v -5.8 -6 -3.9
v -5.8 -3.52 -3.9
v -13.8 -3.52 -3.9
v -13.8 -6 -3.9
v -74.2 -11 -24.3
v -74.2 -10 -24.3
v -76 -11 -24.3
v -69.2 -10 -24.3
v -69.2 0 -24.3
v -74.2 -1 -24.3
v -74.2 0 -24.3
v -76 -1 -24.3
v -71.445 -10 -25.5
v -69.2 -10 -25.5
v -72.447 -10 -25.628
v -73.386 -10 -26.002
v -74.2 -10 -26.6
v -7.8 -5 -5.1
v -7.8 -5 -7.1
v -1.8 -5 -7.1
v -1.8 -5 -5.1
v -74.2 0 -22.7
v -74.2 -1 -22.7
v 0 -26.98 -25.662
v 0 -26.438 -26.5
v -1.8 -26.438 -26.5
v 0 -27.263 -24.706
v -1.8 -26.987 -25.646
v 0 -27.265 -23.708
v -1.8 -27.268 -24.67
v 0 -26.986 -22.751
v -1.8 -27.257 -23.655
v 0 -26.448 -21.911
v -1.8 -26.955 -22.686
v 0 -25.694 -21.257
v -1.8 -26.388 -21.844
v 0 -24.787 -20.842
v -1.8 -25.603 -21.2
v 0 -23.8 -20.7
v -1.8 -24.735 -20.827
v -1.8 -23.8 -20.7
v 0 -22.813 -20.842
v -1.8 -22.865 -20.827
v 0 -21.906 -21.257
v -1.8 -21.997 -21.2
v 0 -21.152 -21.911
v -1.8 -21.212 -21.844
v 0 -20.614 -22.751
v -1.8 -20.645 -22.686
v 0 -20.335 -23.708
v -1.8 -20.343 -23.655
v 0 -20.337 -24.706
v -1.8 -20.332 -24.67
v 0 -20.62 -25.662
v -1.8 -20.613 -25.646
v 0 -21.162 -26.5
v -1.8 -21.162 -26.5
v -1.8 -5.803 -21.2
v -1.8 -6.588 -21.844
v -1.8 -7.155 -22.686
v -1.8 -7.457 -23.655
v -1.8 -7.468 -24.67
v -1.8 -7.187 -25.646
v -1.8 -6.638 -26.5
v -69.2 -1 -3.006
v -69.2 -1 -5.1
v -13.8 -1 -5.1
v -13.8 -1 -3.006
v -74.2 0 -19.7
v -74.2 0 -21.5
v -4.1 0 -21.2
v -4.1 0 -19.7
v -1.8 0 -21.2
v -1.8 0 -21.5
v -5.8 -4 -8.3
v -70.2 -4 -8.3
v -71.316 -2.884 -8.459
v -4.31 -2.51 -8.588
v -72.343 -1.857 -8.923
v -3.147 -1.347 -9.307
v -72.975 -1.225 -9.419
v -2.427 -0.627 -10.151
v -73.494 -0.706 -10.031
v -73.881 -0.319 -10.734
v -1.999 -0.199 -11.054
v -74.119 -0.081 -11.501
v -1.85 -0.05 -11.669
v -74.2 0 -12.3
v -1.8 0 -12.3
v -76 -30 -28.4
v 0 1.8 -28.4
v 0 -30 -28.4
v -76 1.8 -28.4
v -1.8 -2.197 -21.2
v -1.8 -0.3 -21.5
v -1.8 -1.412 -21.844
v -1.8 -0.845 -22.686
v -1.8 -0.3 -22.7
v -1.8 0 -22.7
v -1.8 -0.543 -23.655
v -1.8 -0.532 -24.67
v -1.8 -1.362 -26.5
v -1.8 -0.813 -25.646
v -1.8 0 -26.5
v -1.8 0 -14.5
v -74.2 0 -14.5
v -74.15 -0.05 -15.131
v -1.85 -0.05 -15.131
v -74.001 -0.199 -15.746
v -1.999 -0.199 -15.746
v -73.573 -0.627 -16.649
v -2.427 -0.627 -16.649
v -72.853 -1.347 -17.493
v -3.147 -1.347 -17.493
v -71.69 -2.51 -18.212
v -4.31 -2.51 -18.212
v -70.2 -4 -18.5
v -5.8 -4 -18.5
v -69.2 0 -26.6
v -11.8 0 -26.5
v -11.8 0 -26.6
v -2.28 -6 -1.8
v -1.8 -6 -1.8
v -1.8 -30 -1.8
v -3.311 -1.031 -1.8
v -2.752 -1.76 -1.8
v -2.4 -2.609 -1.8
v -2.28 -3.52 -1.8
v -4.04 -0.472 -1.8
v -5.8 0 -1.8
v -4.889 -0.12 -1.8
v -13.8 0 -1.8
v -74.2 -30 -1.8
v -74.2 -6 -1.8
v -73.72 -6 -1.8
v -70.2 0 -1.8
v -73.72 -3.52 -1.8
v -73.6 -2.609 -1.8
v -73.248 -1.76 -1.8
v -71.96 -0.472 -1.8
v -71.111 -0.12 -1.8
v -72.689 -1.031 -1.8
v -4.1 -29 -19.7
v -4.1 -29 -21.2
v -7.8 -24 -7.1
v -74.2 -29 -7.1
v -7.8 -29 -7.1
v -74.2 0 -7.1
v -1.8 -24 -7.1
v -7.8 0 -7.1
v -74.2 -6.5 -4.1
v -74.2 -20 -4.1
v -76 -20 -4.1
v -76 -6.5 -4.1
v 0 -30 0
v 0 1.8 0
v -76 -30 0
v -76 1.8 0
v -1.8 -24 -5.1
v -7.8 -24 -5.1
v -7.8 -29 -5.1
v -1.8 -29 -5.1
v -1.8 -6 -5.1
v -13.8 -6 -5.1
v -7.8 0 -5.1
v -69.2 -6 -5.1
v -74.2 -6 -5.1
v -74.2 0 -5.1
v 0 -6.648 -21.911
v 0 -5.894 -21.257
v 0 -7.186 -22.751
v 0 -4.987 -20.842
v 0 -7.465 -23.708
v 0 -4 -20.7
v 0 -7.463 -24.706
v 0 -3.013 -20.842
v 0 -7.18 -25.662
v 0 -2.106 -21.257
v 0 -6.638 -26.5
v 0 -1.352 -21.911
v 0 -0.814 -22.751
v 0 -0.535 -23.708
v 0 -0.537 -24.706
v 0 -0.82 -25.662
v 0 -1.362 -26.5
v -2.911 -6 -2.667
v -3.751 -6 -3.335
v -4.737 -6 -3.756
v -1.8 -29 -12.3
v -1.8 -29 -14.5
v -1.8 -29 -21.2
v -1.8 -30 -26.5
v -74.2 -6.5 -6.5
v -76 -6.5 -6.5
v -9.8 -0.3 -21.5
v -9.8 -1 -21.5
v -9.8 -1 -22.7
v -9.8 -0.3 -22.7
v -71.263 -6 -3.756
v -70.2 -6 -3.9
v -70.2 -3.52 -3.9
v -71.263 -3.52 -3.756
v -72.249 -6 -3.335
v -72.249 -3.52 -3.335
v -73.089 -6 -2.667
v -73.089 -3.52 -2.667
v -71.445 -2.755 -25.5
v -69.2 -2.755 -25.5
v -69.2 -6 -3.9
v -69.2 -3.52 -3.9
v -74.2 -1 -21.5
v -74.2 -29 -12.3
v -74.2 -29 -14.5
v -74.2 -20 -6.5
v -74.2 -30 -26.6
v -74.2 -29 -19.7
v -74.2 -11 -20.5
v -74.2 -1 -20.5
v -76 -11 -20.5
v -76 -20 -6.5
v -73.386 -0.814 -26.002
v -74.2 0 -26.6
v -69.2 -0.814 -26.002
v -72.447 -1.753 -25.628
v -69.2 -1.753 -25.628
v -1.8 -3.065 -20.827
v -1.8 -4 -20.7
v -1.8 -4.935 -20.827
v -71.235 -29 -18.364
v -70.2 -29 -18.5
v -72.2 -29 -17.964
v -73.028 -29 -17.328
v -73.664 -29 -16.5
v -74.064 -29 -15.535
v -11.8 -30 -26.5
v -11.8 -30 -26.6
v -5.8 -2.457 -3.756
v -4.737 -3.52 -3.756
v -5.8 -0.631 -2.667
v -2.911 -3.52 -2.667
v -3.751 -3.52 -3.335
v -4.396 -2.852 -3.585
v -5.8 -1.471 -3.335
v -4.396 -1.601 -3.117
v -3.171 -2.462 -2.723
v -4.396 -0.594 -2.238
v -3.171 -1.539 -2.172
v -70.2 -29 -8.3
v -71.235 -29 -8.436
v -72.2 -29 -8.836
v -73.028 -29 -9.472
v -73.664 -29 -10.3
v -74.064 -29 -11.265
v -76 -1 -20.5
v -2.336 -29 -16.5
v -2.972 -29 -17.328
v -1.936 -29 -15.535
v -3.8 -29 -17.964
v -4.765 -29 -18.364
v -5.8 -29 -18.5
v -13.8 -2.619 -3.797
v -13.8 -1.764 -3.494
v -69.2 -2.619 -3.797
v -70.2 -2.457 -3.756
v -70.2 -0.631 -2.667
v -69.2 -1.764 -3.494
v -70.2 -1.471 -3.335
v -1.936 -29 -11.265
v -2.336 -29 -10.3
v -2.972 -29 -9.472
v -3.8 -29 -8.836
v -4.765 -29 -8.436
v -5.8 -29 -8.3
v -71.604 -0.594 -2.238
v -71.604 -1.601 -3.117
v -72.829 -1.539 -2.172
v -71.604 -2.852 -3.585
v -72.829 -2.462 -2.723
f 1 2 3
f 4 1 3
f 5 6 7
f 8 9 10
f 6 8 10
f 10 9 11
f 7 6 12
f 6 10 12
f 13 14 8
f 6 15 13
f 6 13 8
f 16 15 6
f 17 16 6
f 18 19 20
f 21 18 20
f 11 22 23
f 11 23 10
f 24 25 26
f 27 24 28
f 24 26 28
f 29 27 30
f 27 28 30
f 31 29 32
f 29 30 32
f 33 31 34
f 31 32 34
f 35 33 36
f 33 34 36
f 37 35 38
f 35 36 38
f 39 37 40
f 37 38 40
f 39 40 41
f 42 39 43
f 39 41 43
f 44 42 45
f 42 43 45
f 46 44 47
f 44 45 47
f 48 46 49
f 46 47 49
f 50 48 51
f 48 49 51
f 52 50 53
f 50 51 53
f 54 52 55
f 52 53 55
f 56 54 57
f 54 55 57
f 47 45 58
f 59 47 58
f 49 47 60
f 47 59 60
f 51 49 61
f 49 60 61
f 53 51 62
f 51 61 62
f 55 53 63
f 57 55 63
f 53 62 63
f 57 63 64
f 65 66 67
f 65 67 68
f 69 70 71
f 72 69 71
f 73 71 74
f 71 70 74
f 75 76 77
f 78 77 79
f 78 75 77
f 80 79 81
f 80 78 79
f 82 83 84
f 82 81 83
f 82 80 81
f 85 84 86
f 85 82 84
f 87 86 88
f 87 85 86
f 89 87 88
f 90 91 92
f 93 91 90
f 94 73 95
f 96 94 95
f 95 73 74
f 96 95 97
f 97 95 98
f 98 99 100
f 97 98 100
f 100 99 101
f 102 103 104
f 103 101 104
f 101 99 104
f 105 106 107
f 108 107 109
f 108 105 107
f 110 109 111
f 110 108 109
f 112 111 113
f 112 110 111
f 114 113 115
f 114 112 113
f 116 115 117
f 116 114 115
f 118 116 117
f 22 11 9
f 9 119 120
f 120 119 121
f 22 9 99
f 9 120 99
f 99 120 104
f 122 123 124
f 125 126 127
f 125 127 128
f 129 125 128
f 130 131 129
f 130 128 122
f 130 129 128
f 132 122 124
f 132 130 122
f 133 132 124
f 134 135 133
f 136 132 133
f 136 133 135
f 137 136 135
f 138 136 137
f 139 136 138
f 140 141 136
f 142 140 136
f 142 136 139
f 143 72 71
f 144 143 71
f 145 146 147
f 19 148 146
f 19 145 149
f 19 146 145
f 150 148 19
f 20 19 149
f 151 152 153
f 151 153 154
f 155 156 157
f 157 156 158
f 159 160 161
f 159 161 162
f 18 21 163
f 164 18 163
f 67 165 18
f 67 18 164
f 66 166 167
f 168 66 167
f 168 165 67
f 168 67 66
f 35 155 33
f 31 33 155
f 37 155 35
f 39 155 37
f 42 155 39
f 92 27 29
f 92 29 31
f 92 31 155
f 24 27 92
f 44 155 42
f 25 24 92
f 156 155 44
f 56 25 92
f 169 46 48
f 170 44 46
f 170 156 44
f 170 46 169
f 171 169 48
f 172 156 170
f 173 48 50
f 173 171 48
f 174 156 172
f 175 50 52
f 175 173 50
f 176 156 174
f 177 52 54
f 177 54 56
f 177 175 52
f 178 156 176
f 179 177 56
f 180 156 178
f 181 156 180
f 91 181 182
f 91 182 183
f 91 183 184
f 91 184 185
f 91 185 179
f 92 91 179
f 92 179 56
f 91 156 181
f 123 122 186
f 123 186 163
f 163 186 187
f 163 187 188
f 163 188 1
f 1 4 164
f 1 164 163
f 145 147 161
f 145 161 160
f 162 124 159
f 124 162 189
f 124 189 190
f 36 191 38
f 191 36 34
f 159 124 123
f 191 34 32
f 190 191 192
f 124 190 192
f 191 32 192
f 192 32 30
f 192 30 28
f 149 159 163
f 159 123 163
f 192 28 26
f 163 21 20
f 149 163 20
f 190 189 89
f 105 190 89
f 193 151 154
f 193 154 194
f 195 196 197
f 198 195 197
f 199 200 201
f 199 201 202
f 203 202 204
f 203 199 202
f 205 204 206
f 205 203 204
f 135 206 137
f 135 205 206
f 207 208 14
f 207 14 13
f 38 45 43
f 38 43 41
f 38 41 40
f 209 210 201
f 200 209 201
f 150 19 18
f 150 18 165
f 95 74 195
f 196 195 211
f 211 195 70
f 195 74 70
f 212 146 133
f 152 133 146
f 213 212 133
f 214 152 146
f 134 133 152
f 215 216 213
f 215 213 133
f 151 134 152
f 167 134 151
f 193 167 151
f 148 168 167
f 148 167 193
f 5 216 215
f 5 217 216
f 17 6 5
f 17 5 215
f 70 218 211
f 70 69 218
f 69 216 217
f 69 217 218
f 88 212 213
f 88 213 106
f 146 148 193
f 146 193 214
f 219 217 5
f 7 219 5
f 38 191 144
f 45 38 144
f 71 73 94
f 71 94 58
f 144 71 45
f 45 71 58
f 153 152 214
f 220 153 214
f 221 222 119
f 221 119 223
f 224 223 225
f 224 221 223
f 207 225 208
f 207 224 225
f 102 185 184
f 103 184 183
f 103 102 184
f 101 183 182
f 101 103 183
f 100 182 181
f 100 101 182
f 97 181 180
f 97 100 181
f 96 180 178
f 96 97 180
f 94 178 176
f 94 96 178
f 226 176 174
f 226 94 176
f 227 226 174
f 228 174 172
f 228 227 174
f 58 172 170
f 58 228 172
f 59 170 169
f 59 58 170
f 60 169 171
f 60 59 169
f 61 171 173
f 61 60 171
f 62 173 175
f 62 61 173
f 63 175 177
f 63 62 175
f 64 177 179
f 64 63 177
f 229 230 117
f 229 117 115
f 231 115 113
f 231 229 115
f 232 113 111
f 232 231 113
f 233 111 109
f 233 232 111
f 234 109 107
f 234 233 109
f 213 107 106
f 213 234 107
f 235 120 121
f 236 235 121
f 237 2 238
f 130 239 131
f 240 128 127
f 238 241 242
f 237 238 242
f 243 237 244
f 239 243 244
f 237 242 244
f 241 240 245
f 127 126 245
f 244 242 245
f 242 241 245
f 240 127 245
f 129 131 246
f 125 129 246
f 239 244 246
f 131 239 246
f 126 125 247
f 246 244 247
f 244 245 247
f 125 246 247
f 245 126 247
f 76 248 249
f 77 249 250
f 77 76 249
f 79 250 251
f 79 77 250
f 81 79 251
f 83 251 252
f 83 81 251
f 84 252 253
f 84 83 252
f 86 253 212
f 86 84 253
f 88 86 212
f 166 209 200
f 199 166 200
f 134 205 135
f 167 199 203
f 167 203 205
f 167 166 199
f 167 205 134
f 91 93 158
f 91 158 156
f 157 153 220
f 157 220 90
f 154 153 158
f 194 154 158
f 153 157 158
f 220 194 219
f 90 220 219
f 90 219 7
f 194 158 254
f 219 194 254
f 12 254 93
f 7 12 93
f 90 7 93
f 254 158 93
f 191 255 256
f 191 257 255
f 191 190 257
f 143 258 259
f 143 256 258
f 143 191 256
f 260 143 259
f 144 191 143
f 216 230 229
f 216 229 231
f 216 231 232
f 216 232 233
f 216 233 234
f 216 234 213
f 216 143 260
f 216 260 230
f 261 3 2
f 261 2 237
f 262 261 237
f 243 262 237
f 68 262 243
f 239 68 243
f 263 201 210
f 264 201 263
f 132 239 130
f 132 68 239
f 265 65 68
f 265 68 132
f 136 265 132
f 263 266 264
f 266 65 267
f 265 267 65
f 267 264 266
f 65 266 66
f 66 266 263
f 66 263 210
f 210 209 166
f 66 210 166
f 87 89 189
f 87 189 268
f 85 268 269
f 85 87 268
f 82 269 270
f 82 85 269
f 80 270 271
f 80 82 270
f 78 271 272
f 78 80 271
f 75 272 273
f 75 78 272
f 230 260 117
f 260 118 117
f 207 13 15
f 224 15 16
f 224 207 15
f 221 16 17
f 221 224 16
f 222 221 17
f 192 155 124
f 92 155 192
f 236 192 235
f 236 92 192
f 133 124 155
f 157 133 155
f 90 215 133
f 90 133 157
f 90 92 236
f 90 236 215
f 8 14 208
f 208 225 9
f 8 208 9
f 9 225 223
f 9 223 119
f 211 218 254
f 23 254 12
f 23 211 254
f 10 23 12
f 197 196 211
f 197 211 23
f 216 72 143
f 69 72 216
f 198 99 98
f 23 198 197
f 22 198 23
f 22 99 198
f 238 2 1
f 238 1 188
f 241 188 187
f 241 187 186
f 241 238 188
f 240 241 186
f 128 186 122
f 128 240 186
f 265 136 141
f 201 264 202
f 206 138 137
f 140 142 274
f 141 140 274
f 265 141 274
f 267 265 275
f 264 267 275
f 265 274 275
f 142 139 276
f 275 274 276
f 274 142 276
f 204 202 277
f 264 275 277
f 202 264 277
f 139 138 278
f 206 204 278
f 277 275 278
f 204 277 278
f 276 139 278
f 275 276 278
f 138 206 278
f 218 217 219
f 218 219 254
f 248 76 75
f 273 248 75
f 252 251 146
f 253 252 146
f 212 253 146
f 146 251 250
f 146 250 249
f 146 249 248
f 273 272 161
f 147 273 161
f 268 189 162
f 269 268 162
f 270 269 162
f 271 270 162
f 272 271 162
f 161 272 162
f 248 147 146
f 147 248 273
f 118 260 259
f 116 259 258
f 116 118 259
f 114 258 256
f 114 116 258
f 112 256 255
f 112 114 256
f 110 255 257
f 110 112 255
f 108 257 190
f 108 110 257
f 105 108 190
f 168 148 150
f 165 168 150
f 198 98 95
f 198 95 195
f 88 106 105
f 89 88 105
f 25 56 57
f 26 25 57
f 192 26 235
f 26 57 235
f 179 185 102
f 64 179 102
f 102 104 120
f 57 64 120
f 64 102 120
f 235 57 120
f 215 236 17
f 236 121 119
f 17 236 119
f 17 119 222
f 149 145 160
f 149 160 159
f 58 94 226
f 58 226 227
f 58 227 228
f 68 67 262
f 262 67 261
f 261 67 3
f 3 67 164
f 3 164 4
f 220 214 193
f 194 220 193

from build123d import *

# Parameters (mm, degrees)
SKETCH1_W            = 76
SKETCH1_H            = 28.4
BOSS_EXTRUDE1_DEPTH  = 1.8
SKETCH2_W            = 76
SKETCH2_H            = 1.8
BOSS_EXTRUDE2_DEPTH  = 30
SKETCH3_W            = 1.8
SKETCH3_H            = 26.6
BOSS_EXTRUDE3_DEPTH  = 30
SKETCH4_W            = 72.4
SKETCH4_H            = 1.2
BOSS_EXTRUDE4_DEPTH  = 1
SKETCH5_W            = 5
SKETCH5_H            = 1.2
BOSS_EXTRUDE5_DEPTH  = 28
SKETCH6_W            = 2.8
SKETCH6_H            = 10
CUT_EXTRUDE1_DEPTH   = 2
SKETCH7_W            = 5
SKETCH7_H            = 1.2
BOSS_EXTRUDE6_DEPTH  = 10
SKETCH8_W            = 8
SKETCH8_H            = 1.2
CUT_EXTRUDE2_DEPTH   = 0.7
SKETCH9_W            = 10
SKETCH9_H            = 0.1
BOSS_EXTRUDE7_DEPTH  = 30
CUT_EXTRUDE3_DEPTH   = 2
SKETCH11_W           = 62.4
SKETCH11_H           = 1.2
BOSS_EXTRUDE8_DEPTH  = 28
SKETCH12_W           = 72.4
SKETCH12_H           = 1.2
BOSS_EXTRUDE9_DEPTH  = 29
SKETCH13_W           = 72.4
SKETCH13_H           = 1.2
BOSS_EXTRUDE10_DEPTH = 1
SKETCH14_W           = 5
SKETCH14_H           = 1.2
SKETCH14_W_2         = 12
BOSS_EXTRUDE11_DEPTH = 5
SKETCH15_W           = 6
SKETCH15_H           = 5
BOSS_EXTRUDE12_DEPTH = 2
SKETCH16_W           = 2.4
SKETCH16_H           = 13.5
CUT_EXTRUDE4_DEPTH   = 2
SKETCH17_W           = 72.4
SKETCH17_H           = 1.8
BOSS_EXTRUDE13_DEPTH = 30
FILLET1_R            = 4
SKETCH19_W           = 2.3
SKETCH19_H           = 1.5
BOSS_EXTRUDE14_DEPTH = 29
FILLET2_R            = 4
FILLET3_R            = 4
FILLET4_R            = 4
SKETCH18_W           = 1
SKETCH18_H           = 10
CUT_EXTRUDE5_DEPTH   = 2


with BuildPart() as part:
    # Sketch1 → Boss-Extrude1 (new body)
    with BuildSketch(Plane(origin=(0, 0, 0), x_dir=(1, 0, 0), z_dir=(0, 1, 0))):
        with Locations((-38, 14.2)):
            Rectangle(SKETCH1_W, SKETCH1_H)
    extrude(amount=BOSS_EXTRUDE1_DEPTH)

    # Sketch2 → Boss-Extrude2 (add)
    with BuildSketch(Plane(origin=(0, 0, 0), x_dir=(-1, 0, 0), z_dir=(0, -1, 0))):
        with Locations((38, 27.5)):
            Rectangle(SKETCH2_W, SKETCH2_H)
    extrude(amount=BOSS_EXTRUDE2_DEPTH)

    # Sketch3 → Boss-Extrude3 (add)
    with BuildSketch(Plane(origin=(0, 0, 0), x_dir=(-1, 0, 0), z_dir=(0, -1, 0))):
        with Locations((75.1, 13.3)):
            Rectangle(SKETCH3_W, SKETCH3_H)
        with Locations((0.9, 13.3)):
            Rectangle(SKETCH3_W, SKETCH3_H)
    extrude(amount=BOSS_EXTRUDE3_DEPTH)

    # Sketch4 → Boss-Extrude4 (add)
    with BuildSketch(Plane(origin=(0, 0, 0), x_dir=(-1, 0, 0), z_dir=(0, -1, 0))):
        with Locations((38, 19.1)):
            Rectangle(SKETCH4_W, SKETCH4_H)
        with Locations((38, 22.1)):
            Rectangle(SKETCH4_W, SKETCH4_H)
    extrude(amount=BOSS_EXTRUDE4_DEPTH)

    # Sketch5 → Boss-Extrude5 (add)
    with BuildSketch(Plane(origin=(0, -1, 0), x_dir=(-1, 0, 0), z_dir=(0, -1, 0))):
        with Locations((4.3, 19.1)):
            Rectangle(SKETCH5_W, SKETCH5_H)
        with Locations((71.7, 19.1)):
            Rectangle(SKETCH5_W, SKETCH5_H)
    extrude(amount=BOSS_EXTRUDE5_DEPTH)

    # Sketch6 → Cut-Extrude1 (cut)
    with BuildSketch(Plane(origin=(-74.2, 0, 0), x_dir=(0, 0, -1), z_dir=(1, 0, 0))):
        with Locations((22.9, -6)):
            Rectangle(SKETCH6_W, SKETCH6_H)
    extrude(amount=-CUT_EXTRUDE1_DEPTH, mode=Mode.SUBTRACT)

    # Sketch7 → Boss-Extrude6 (add)
    with BuildSketch(Plane(origin=(0, 0, 0), x_dir=(-1, 0, 0), z_dir=(0, -1, 0))):
        with Locations((71.7, 24.9)):
            Rectangle(SKETCH7_W, SKETCH7_H)
    extrude(amount=BOSS_EXTRUDE6_DEPTH)

    # Sketch8 → Cut-Extrude2 (cut)
    with BuildSketch(Plane(origin=(0, -1, 0), x_dir=(-1, 0, 0), z_dir=(0, -1, 0))):
        with Locations((5.8, 22.1)):
            Rectangle(SKETCH8_W, SKETCH8_H)
    extrude(amount=-CUT_EXTRUDE2_DEPTH, mode=Mode.SUBTRACT)

    # Sketch9 → Boss-Extrude7 (add)
    with BuildSketch(Plane(origin=(0, 0, 0), x_dir=(-1, 0, 0), z_dir=(0, -1, 0))):
        with Locations((6.8, 26.55)):
            Rectangle(SKETCH9_W, SKETCH9_H)
    extrude(amount=BOSS_EXTRUDE7_DEPTH)

    # Sketch10 → Cut-Extrude3 (cut)
    with BuildSketch(Plane.ZY.offset(1.8)):
        with BuildLine():
            Line((-26.5, -6.638181192), (-26.5, -1.361818808))
            ThreePointArc((-26.5, -1.361818808), (-20.7, -4), (-26.5, -6.638181192))
        make_face()
        with BuildLine():
            Line((-26.5, -21.161818808), (-26.5, -26.438181192))
            ThreePointArc((-26.5, -26.438181192), (-20.7, -23.8), (-26.5, -21.161818808))
        make_face()
    extrude(amount=-CUT_EXTRUDE3_DEPTH, mode=Mode.SUBTRACT)

    # Sketch11 → Boss-Extrude8 (add)
    with BuildSketch(Plane(origin=(0, -1, 0), x_dir=(-1, 0, 0), z_dir=(0, -1, 0))):
        with Locations((38, 19.1)):
            Rectangle(SKETCH11_W, SKETCH11_H)
    extrude(amount=BOSS_EXTRUDE8_DEPTH)

    # Sketch12 → Boss-Extrude9 (add)
    with BuildSketch(Plane.XZ):
        with Locations((-38, -7.7)):
            Rectangle(SKETCH12_W, SKETCH12_H)
    extrude(amount=BOSS_EXTRUDE9_DEPTH)

    # Sketch13 → Boss-Extrude10 (add)
    with BuildSketch(Plane(origin=(0, 0, 0), x_dir=(-1, 0, 0), z_dir=(0, -1, 0))):
        with Locations((38, 4.5)):
            Rectangle(SKETCH13_W, SKETCH13_H)
    extrude(amount=BOSS_EXTRUDE10_DEPTH)

    # Sketch14 → Boss-Extrude11 (add)
    with BuildSketch(Plane(origin=(0, -1, 0), x_dir=(-1, 0, 0), z_dir=(0, -1, 0))):
        with Locations((71.7, 4.5)):
            Rectangle(SKETCH14_W, SKETCH14_H)
        with Locations((7.8, 4.5)):
            Rectangle(SKETCH14_W_2, SKETCH14_H)
    extrude(amount=BOSS_EXTRUDE11_DEPTH)

    # Sketch15 → Boss-Extrude12 (add)
    with BuildSketch(Plane.XY.offset(-7.1)):
        with Locations((-4.8, -26.5)):
            Rectangle(SKETCH15_W, SKETCH15_H)
        with Locations((-4.8, -2.5)):
            Rectangle(SKETCH15_W, SKETCH15_H)
    extrude(amount=BOSS_EXTRUDE12_DEPTH)

    # Sketch16 → Cut-Extrude4 (cut)
    with BuildSketch(Plane(origin=(-74.2, 0, 0), x_dir=(0, 0, -1), z_dir=(1, 0, 0))):
        with Locations((5.3, -13.25)):
            Rectangle(SKETCH16_W, SKETCH16_H)
    extrude(amount=-CUT_EXTRUDE4_DEPTH, mode=Mode.SUBTRACT)

    # Sketch17 → Boss-Extrude13 (add)
    with BuildSketch(Plane(origin=(0, 0, 0), x_dir=(-1, 0, 0), z_dir=(0, -1, 0))):
        with Locations((38, 0.9)):
            Rectangle(SKETCH17_W, SKETCH17_H)
    extrude(amount=BOSS_EXTRUDE13_DEPTH)

    # Fillet1
    # the kernel refuses this fillet: 4 mm, written as the material it adds along each edge
    with BuildSketch(Plane(origin=(-74.2, 0, -25.5), x_dir=(0, -1, 0), z_dir=(1, 0, 0))) as fillet1_piece_1:
        with BuildLine():
            CenterArc((2.754995463, 4), FILLET1_R, 226.468847833, 43.531152167)
            Line((0, 1.1), (-0.055099909, 1.042))
            ThreePointArc((-0.055099909, 1.042), (-0.08, 0.55), (-0.08, 0))
            Line((-0.08, 0), (0, -0.08))
            Line((0, -0.08), (2.754995463, -0.08))
            Line((2.754995463, -0.08), (2.754995463, 0))
        make_face()
    extrude(amount=5)
    with BuildSketch(Plane(origin=(-74.2, 0, -25.5), x_dir=(0, 0, -1), z_dir=(0, -1, 0))) as fillet1_piece_2:
        with BuildLine():
            CenterArc((4, 2.754995463), FILLET1_R, 180, 43.531152167)
            Line((0, 2.754995463), (-0.08, 2.754995463))
            Line((-0.08, 2.754995463), (-0.08, 0))
            Line((-0.08, 0), (0, -0.08))
            ThreePointArc((0, -0.08), (0.55, -0.08), (1.042, -0.055099909))
            Line((1.042, -0.055099909), (1.1, 0))
        make_face()
    extrude(amount=10)
    with BuildSketch(Plane(origin=(-1.8, 0, -8.3), x_dir=(0, 0, -1), z_dir=(0, -1, 0))) as fillet1_piece_3:
        with BuildLine():
            CenterArc((FILLET1_R, -FILLET1_R), FILLET1_R, 90, 90)
            Line((0, -FILLET1_R), (-FILLET1_R * 0.02, -FILLET1_R))
            Line((-FILLET1_R * 0.02, -FILLET1_R), (-FILLET1_R * 0.02, FILLET1_R * 0.02))
            Line((-FILLET1_R * 0.02, FILLET1_R * 0.02), (FILLET1_R, FILLET1_R * 0.02))
            Line((FILLET1_R, FILLET1_R * 0.02), (FILLET1_R, 0))
        make_face()
    extrude(amount=29)
    with BuildSketch(Plane(origin=(-1.8, 0, -8.3), x_dir=(0, 0, -1), z_dir=(-1, 0, 0)), Plane(origin=(-1.8, 0, -18.5), x_dir=(0, -1, 0), z_dir=(-1, 0, 0))) as fillet1_piece_4:
        with BuildLine():
            CenterArc((FILLET1_R, FILLET1_R), FILLET1_R, 180, 90)
            Line((0, FILLET1_R), (-FILLET1_R * 0.02, FILLET1_R))
            Line((-FILLET1_R * 0.02, FILLET1_R), (-FILLET1_R * 0.02, -FILLET1_R * 0.02))
            Line((-FILLET1_R * 0.02, -FILLET1_R * 0.02), (FILLET1_R, -FILLET1_R * 0.02))
            Line((FILLET1_R, -FILLET1_R * 0.02), (FILLET1_R, 0))
        make_face()
    extrude(amount=72.4)
    with BuildSketch(Plane(origin=(-74.2, 0, -8.3), x_dir=(0, 0, -1), z_dir=(0, -1, 0)), Plane(origin=(-1.8, 0, -18.5), x_dir=(0, 0, 1), z_dir=(0, -1, 0)), Plane(origin=(-74.2, -29, -18.5), x_dir=(0, 0, 1), z_dir=(0, 1, 0))) as fillet1_piece_5:
        with BuildLine():
            CenterArc((FILLET1_R, FILLET1_R), FILLET1_R, 180, 90)
            Line((0, FILLET1_R), (-FILLET1_R * 0.02, FILLET1_R))
            Line((-FILLET1_R * 0.02, FILLET1_R), (-FILLET1_R * 0.02, -FILLET1_R * 0.02))
            Line((-FILLET1_R * 0.02, -FILLET1_R * 0.02), (FILLET1_R, -FILLET1_R * 0.02))
            Line((FILLET1_R, -FILLET1_R * 0.02), (FILLET1_R, 0))
        make_face()
    extrude(amount=29)
    with BuildSketch(Plane(origin=(-74.2, 6.887488657, -25.5), x_dir=(0, 0, -1), z_dir=(0, -1, 0))) as fillet1_piece_6a_section:
        with BuildLine():
            CenterArc((4, 2.754995463), FILLET1_R, 180, 43.531152167)
            Line((0, 2.754995463), (-0.08, 2.754995463))
            Line((-0.08, 2.754995463), (-0.08, 0))
            Line((-0.08, 0), (0, -0.08))
            ThreePointArc((0, -0.08), (0.55, -0.08), (1.042, -0.055099909))
            Line((1.042, -0.055099909), (1.1, 0))
        make_face()
    fillet1_piece_6a = extrude(amount=16.887488657, mode=Mode.PRIVATE)
    fillet1_piece_6a = split(fillet1_piece_6a, bisect_by=Plane(origin=(-73.454361025, 0, -25.767986637), z_dir=(0, 1, 0)), keep=Keep.TOP, mode=Mode.PRIVATE)
    with BuildSketch(Plane(origin=(-81.087488657, 0, -25.5), x_dir=(0, -1, 0), z_dir=(1, 0, 0))) as fillet1_piece_6b_section:
        with BuildLine():
            CenterArc((2.754995463, 4), FILLET1_R, 226.468847833, 43.531152167)
            Line((0, 1.1), (-0.055099909, 1.042))
            ThreePointArc((-0.055099909, 1.042), (-0.08, 0.55), (-0.08, 0))
            Line((-0.08, 0), (0, -0.08))
            Line((0, -0.08), (2.754995463, -0.08))
            Line((2.754995463, -0.08), (2.754995463, 0))
        make_face()
    fillet1_piece_6b = extrude(amount=11.887488657, mode=Mode.PRIVATE)
    fillet1_piece_6b = split(fillet1_piece_6b, bisect_by=Plane(origin=(-74.2, -0.745638975, -25.767986637), z_dir=(-1, 0, 0)), keep=Keep.TOP, mode=Mode.PRIVATE)
    fillet1_piece_6 = fillet1_piece_6a & fillet1_piece_6b
    add(fillet1_piece_6)
    with BuildSketch(Plane(origin=(-1.8, 10, -8.3), x_dir=(0, 0, -1), z_dir=(0, -1, 0))) as fillet1_piece_7a_section:
        with BuildLine():
            CenterArc((FILLET1_R, -FILLET1_R), FILLET1_R, 90, 90)
            Line((0, -FILLET1_R), (-FILLET1_R * 0.02, -FILLET1_R))
            Line((-FILLET1_R * 0.02, -FILLET1_R), (-FILLET1_R * 0.02, FILLET1_R * 0.02))
            Line((-FILLET1_R * 0.02, FILLET1_R * 0.02), (FILLET1_R, FILLET1_R * 0.02))
            Line((FILLET1_R, FILLET1_R * 0.02), (FILLET1_R, 0))
        make_face()
    fillet1_piece_7a = extrude(amount=39, mode=Mode.PRIVATE)
    fillet1_piece_7a = split(fillet1_piece_7a, bisect_by=Plane(origin=(-2.705580457, 0, -9.205580457), z_dir=(0, 1, 0)), keep=Keep.TOP, mode=Mode.PRIVATE)
    with BuildSketch(Plane(origin=(8.2, 0, -8.3), x_dir=(0, 0, -1), z_dir=(-1, 0, 0))) as fillet1_piece_7b_section:
        with BuildLine():
            CenterArc((FILLET1_R, FILLET1_R), FILLET1_R, 180, 90)
            Line((0, FILLET1_R), (-FILLET1_R * 0.02, FILLET1_R))
            Line((-FILLET1_R * 0.02, FILLET1_R), (-FILLET1_R * 0.02, -FILLET1_R * 0.02))
            Line((-FILLET1_R * 0.02, -FILLET1_R * 0.02), (FILLET1_R, -FILLET1_R * 0.02))
            Line((FILLET1_R, -FILLET1_R * 0.02), (FILLET1_R, 0))
        make_face()
    fillet1_piece_7b = extrude(amount=82.4, mode=Mode.PRIVATE)
    fillet1_piece_7b = split(fillet1_piece_7b, bisect_by=Plane(origin=(-1.8, -0.905580457, -9.205580457), z_dir=(1, 0, 0)), keep=Keep.TOP, mode=Mode.PRIVATE)
    fillet1_piece_7 = fillet1_piece_7a & fillet1_piece_7b
    add(fillet1_piece_7)
    with BuildSketch(Plane(origin=(-74.2, 10, -8.3), x_dir=(0, 0, -1), z_dir=(0, -1, 0))) as fillet1_piece_8a_section:
        with BuildLine():
            CenterArc((FILLET1_R, FILLET1_R), FILLET1_R, 180, 90)
            Line((0, FILLET1_R), (-FILLET1_R * 0.02, FILLET1_R))
            Line((-FILLET1_R * 0.02, FILLET1_R), (-FILLET1_R * 0.02, -FILLET1_R * 0.02))
            Line((-FILLET1_R * 0.02, -FILLET1_R * 0.02), (FILLET1_R, -FILLET1_R * 0.02))
            Line((FILLET1_R, -FILLET1_R * 0.02), (FILLET1_R, 0))
        make_face()
    fillet1_piece_8a = extrude(amount=39, mode=Mode.PRIVATE)
    fillet1_piece_8a = split(fillet1_piece_8a, bisect_by=Plane(origin=(-73.294419543, 0, -9.205580457), z_dir=(0, 1, 0)), keep=Keep.TOP, mode=Mode.PRIVATE)
    with BuildSketch(Plane(origin=(-1.8, 0, -8.3), x_dir=(0, 0, -1), z_dir=(-1, 0, 0))) as fillet1_piece_8b_section:
        with BuildLine():
            CenterArc((FILLET1_R, FILLET1_R), FILLET1_R, 180, 90)
            Line((0, FILLET1_R), (-FILLET1_R * 0.02, FILLET1_R))
            Line((-FILLET1_R * 0.02, FILLET1_R), (-FILLET1_R * 0.02, -FILLET1_R * 0.02))
            Line((-FILLET1_R * 0.02, -FILLET1_R * 0.02), (FILLET1_R, -FILLET1_R * 0.02))
            Line((FILLET1_R, -FILLET1_R * 0.02), (FILLET1_R, 0))
        make_face()
    fillet1_piece_8b = extrude(amount=82.4, mode=Mode.PRIVATE)
    fillet1_piece_8b = split(fillet1_piece_8b, bisect_by=Plane(origin=(-74.2, -0.905580457, -9.205580457), z_dir=(-1, 0, 0)), keep=Keep.TOP, mode=Mode.PRIVATE)
    fillet1_piece_8 = fillet1_piece_8a & fillet1_piece_8b
    add(fillet1_piece_8)
    with BuildSketch(Plane(origin=(-1.8, 10, -18.5), x_dir=(0, 0, 1), z_dir=(0, -1, 0))) as fillet1_piece_9a_section:
        with BuildLine():
            CenterArc((FILLET1_R, FILLET1_R), FILLET1_R, 180, 90)
            Line((0, FILLET1_R), (-FILLET1_R * 0.02, FILLET1_R))
            Line((-FILLET1_R * 0.02, FILLET1_R), (-FILLET1_R * 0.02, -FILLET1_R * 0.02))
            Line((-FILLET1_R * 0.02, -FILLET1_R * 0.02), (FILLET1_R, -FILLET1_R * 0.02))
            Line((FILLET1_R, -FILLET1_R * 0.02), (FILLET1_R, 0))
        make_face()
    fillet1_piece_9a = extrude(amount=39, mode=Mode.PRIVATE)
    fillet1_piece_9a = split(fillet1_piece_9a, bisect_by=Plane(origin=(-2.705580457, 0, -17.594419543), z_dir=(0, 1, 0)), keep=Keep.TOP, mode=Mode.PRIVATE)
    with BuildSketch(Plane(origin=(8.2, 0, -18.5), x_dir=(0, -1, 0), z_dir=(-1, 0, 0))) as fillet1_piece_9b_section:
        with BuildLine():
            CenterArc((FILLET1_R, FILLET1_R), FILLET1_R, 180, 90)
            Line((0, FILLET1_R), (-FILLET1_R * 0.02, FILLET1_R))
            Line((-FILLET1_R * 0.02, FILLET1_R), (-FILLET1_R * 0.02, -FILLET1_R * 0.02))
            Line((-FILLET1_R * 0.02, -FILLET1_R * 0.02), (FILLET1_R, -FILLET1_R * 0.02))
            Line((FILLET1_R, -FILLET1_R * 0.02), (FILLET1_R, 0))
        make_face()
    fillet1_piece_9b = extrude(amount=82.4, mode=Mode.PRIVATE)
    fillet1_piece_9b = split(fillet1_piece_9b, bisect_by=Plane(origin=(-1.8, -0.905580457, -17.594419543), z_dir=(1, 0, 0)), keep=Keep.TOP, mode=Mode.PRIVATE)
    fillet1_piece_9 = fillet1_piece_9a & fillet1_piece_9b
    add(fillet1_piece_9)
    with BuildSketch(Plane(origin=(-74.2, -29, -18.5), x_dir=(0, 0, 1), z_dir=(0, 1, 0))) as fillet1_piece_10a_section:
        with BuildLine():
            CenterArc((FILLET1_R, FILLET1_R), FILLET1_R, 180, 90)
            Line((0, FILLET1_R), (-FILLET1_R * 0.02, FILLET1_R))
            Line((-FILLET1_R * 0.02, FILLET1_R), (-FILLET1_R * 0.02, -FILLET1_R * 0.02))
            Line((-FILLET1_R * 0.02, -FILLET1_R * 0.02), (FILLET1_R, -FILLET1_R * 0.02))
            Line((FILLET1_R, -FILLET1_R * 0.02), (FILLET1_R, 0))
        make_face()
    fillet1_piece_10a = extrude(amount=39, mode=Mode.PRIVATE)
    fillet1_piece_10a = split(fillet1_piece_10a, bisect_by=Plane(origin=(-73.294419543, 0, -17.594419543), z_dir=(0, 1, 0)), keep=Keep.TOP, mode=Mode.PRIVATE)
    with BuildSketch(Plane(origin=(-1.8, 0, -18.5), x_dir=(0, -1, 0), z_dir=(-1, 0, 0))) as fillet1_piece_10b_section:
        with BuildLine():
            CenterArc((FILLET1_R, FILLET1_R), FILLET1_R, 180, 90)
            Line((0, FILLET1_R), (-FILLET1_R * 0.02, FILLET1_R))
            Line((-FILLET1_R * 0.02, FILLET1_R), (-FILLET1_R * 0.02, -FILLET1_R * 0.02))
            Line((-FILLET1_R * 0.02, -FILLET1_R * 0.02), (FILLET1_R, -FILLET1_R * 0.02))
            Line((FILLET1_R, -FILLET1_R * 0.02), (FILLET1_R, 0))
        make_face()
    fillet1_piece_10b = extrude(amount=82.4, mode=Mode.PRIVATE)
    fillet1_piece_10b = split(fillet1_piece_10b, bisect_by=Plane(origin=(-74.2, -0.905580457, -17.594419543), z_dir=(-1, 0, 0)), keep=Keep.TOP, mode=Mode.PRIVATE)
    fillet1_piece_10 = fillet1_piece_10a & fillet1_piece_10b
    add(fillet1_piece_10)

    # Sketch19 → Boss-Extrude14 (add)
    with BuildSketch(Plane(origin=(0, 0, 0), x_dir=(-1, 0, 0), z_dir=(0, -1, 0))):
        with Locations((2.95, 20.45)):
            Rectangle(SKETCH19_W, SKETCH19_H)
    extrude(amount=BOSS_EXTRUDE14_DEPTH)

    # Fillet2
    # the kernel refuses this fillet: 4 mm, written as the material it adds along each edge
    with BuildSketch(Plane(origin=(-74.2, 0, -3.9), x_dir=(0, 0, 1), z_dir=(1, 0, 0))) as fillet2_piece_1_section:
        with BuildLine():
            CenterArc((4, 3.519943181), FILLET2_R, 180, 61.640649972)
            Line((0, 3.519943181), (-0.08, 3.519943181))
            Line((-0.08, 3.519943181), (-0.08, 0))
            Line((-0.08, 0), (0, -0.08))
            ThreePointArc((0, -0.08), (1.05, -0.08), (2.062, -0.070398864))
            Line((2.062, -0.070398864), (2.1, 0))
        make_face()
    fillet2_piece_1 = extrude(amount=72.4, mode=Mode.PRIVATE)
    fillet2_piece_1 = split(fillet2_piece_1, bisect_by=Plane(origin=(-69.2, -0.386743346, -3.163583033), z_dir=(-1, 0, 0)), keep=Keep.TOP, mode=Mode.PRIVATE)
    fillet2_piece_1 = split(fillet2_piece_1, bisect_by=Plane(origin=(-71.7, -1, -3.163583033), z_dir=(0, 1, 0)), keep=Keep.TOP, mode=Mode.PRIVATE)
    add(fillet2_piece_1)
    with BuildSketch(Plane(origin=(-74.2, 0, -3.9), x_dir=(0, 0, 1), z_dir=(1, 0, 0))) as fillet2_piece_2_section:
        with BuildLine():
            CenterArc((4, 3.519943181), FILLET2_R, 180, 61.640649972)
            Line((0, 3.519943181), (-0.08, 3.519943181))
            Line((-0.08, 3.519943181), (-0.08, 0))
            Line((-0.08, 0), (0, -0.08))
            ThreePointArc((0, -0.08), (1.05, -0.08), (2.062, -0.070398864))
            Line((2.062, -0.070398864), (2.1, 0))
        make_face()
    fillet2_piece_2 = extrude(amount=72.4, mode=Mode.PRIVATE)
    fillet2_piece_2 = split(fillet2_piece_2, bisect_by=Plane(origin=(-69.2, -1.757123938, -3.704514418), z_dir=(-1, 0, 0)), keep=Keep.TOP, mode=Mode.PRIVATE)
    fillet2_piece_2 = split(fillet2_piece_2, bisect_by=Plane(origin=(-71.7, -1, -3.704514418), z_dir=(0, -1, 0)), keep=Keep.TOP, mode=Mode.PRIVATE)
    add(fillet2_piece_2)
    with BuildSketch(Plane(origin=(-74.2, 0, -3.9), x_dir=(0, 0, 1), z_dir=(1, 0, 0))) as fillet2_piece_3_section:
        with BuildLine():
            CenterArc((4, 3.519943181), FILLET2_R, 180, 61.640649972)
            Line((0, 3.519943181), (-0.08, 3.519943181))
            Line((-0.08, 3.519943181), (-0.08, 0))
            Line((-0.08, 0), (0, -0.08))
            ThreePointArc((0, -0.08), (1.05, -0.08), (2.062, -0.070398864))
            Line((2.062, -0.070398864), (2.1, 0))
        make_face()
    fillet2_piece_3 = extrude(amount=72.4, mode=Mode.PRIVATE)
    fillet2_piece_3 = split(fillet2_piece_3, bisect_by=Plane(origin=(-69.2, -0.386743346, -3.163583033), z_dir=(1, 0, 0)), keep=Keep.TOP, mode=Mode.PRIVATE)
    fillet2_piece_3 = split(fillet2_piece_3, bisect_by=Plane(origin=(-41.5, -1, -3.163583033), z_dir=(0, 1, 0)), keep=Keep.TOP, mode=Mode.PRIVATE)
    fillet2_piece_3 = split(fillet2_piece_3, bisect_by=Plane(origin=(-13.8, -0.386743346, -3.163583033), z_dir=(-1, 0, 0)), keep=Keep.TOP, mode=Mode.PRIVATE)
    add(fillet2_piece_3)
    with BuildSketch(Plane(origin=(-74.2, 0, -3.9), x_dir=(0, 0, 1), z_dir=(1, 0, 0))) as fillet2_piece_4_section:
        with BuildLine():
            CenterArc((4, 3.519943181), FILLET2_R, 180, 61.640649972)
            Line((0, 3.519943181), (-0.08, 3.519943181))
            Line((-0.08, 3.519943181), (-0.08, 0))
            Line((-0.08, 0), (0, -0.08))
            ThreePointArc((0, -0.08), (1.05, -0.08), (2.062, -0.070398864))
            Line((2.062, -0.070398864), (2.1, 0))
        make_face()
    fillet2_piece_4 = extrude(amount=72.4, mode=Mode.PRIVATE)
    fillet2_piece_4 = split(fillet2_piece_4, bisect_by=Plane(origin=(-7.8, -1, -3.163583033), z_dir=(0, 1, 0)), keep=Keep.TOP, mode=Mode.PRIVATE)
    fillet2_piece_4 = split(fillet2_piece_4, bisect_by=Plane(origin=(-13.8, -0.386743346, -3.163583033), z_dir=(1, 0, 0)), keep=Keep.TOP, mode=Mode.PRIVATE)
    add(fillet2_piece_4)
    with BuildSketch(Plane(origin=(-74.2, 0, -3.9), x_dir=(0, 0, 1), z_dir=(1, 0, 0))) as fillet2_piece_5_section:
        with BuildLine():
            CenterArc((4, 3.519943181), FILLET2_R, 180, 61.640649972)
            Line((0, 3.519943181), (-0.08, 3.519943181))
            Line((-0.08, 3.519943181), (-0.08, 0))
            Line((-0.08, 0), (0, -0.08))
            ThreePointArc((0, -0.08), (1.05, -0.08), (2.062, -0.070398864))
            Line((2.062, -0.070398864), (2.1, 0))
        make_face()
    fillet2_piece_5 = extrude(amount=72.4, mode=Mode.PRIVATE)
    fillet2_piece_5 = split(fillet2_piece_5, bisect_by=Plane(origin=(-7.8, -1, -3.704514418), z_dir=(0, -1, 0)), keep=Keep.TOP, mode=Mode.PRIVATE)
    fillet2_piece_5 = split(fillet2_piece_5, bisect_by=Plane(origin=(-13.8, -1.757123938, -3.704514418), z_dir=(1, 0, 0)), keep=Keep.TOP, mode=Mode.PRIVATE)
    add(fillet2_piece_5)

    # Fillet3
    # the kernel refuses this fillet: 4 mm, written as the material it adds along each edge
    with BuildSketch(Plane(origin=(-74.2, -6, -3.9), x_dir=(1, 0, 0), z_dir=(0, 1, 0))) as fillet3_piece_1_section:
        with BuildLine():
            CenterArc((FILLET3_R, -FILLET3_R), FILLET3_R, 90, 90)
            Line((0, -FILLET3_R), (0, 0))
            Line((0, 0), (FILLET3_R, 0))
        make_face()
    fillet3_piece_1 = extrude(amount=2.480056819, mode=Mode.PRIVATE)
    fillet3_piece_1 = split(fillet3_piece_1, bisect_by=Plane(origin=(-72.77704302, -5.337014611, -1.8), z_dir=(0, 0, -1)), keep=Keep.TOP, mode=Mode.PRIVATE)
    add(fillet3_piece_1)
    with BuildSketch(Plane(origin=(-74.2, -3.519943181, 0.1), x_dir=(0, -0.42114798724942737, 0.9069919364778037), z_dir=(0, -0.9069919364778037, -0.42114798724942737))) as fillet3_piece_2_section:
        with BuildLine():
            CenterArc((4 - FILLET3_R, -FILLET3_R), FILLET3_R, 0, 90)
            Line((4 - FILLET3_R, 0), (4, 0))
            Line((4, 0), (4, -FILLET3_R))
        make_face()
    fillet3_piece_2 = revolve(axis=Axis((-74.2, -3.519943181, 0.1), (-1, 0, 0)), revolution_arc=204.907085957, mode=Mode.PRIVATE)
    fillet3_piece_2 = split(fillet3_piece_2, bisect_by=Plane(origin=(-73.105752366, -1.96496167, -1.8), z_dir=(0, 0, -1)), keep=Keep.TOP, mode=Mode.PRIVATE)
    add(fillet3_piece_2)

    # Fillet4
    # the kernel refuses this fillet: 4 mm, written as the material it adds along each edge
    with BuildSketch(Plane(origin=(-1.8, -3.519943181, -3.9), x_dir=(0, 0, 1), z_dir=(0, -1, 0))) as fillet4_piece_1_section:
        with BuildLine():
            CenterArc((FILLET4_R, FILLET4_R), FILLET4_R, 180, 90)
            Line((0, FILLET4_R), (0, 0))
            Line((0, 0), (FILLET4_R, 0))
        make_face()
    fillet4_piece_1 = extrude(amount=2.480056819, mode=Mode.PRIVATE)
    fillet4_piece_1 = split(fillet4_piece_1, bisect_by=Plane(origin=(-2.621035263, -4.579536444, 0), z_dir=(0, 0, -1)), keep=Keep.TOP, mode=Mode.PRIVATE)
    add(fillet4_piece_1)
    with BuildSketch(Plane(origin=(-1.8, -3.519943181, 0.1), x_dir=(0, 0, -1), z_dir=(0, -1, 0))) as fillet4_piece_2_section:
        with BuildLine():
            CenterArc((4 - FILLET4_R, -FILLET4_R), FILLET4_R, 0, 90)
            Line((4 - FILLET4_R, 0), (4, 0))
            Line((4, 0), (4, -FILLET4_R))
        make_face()
    fillet4_piece_2 = revolve(axis=Axis((-1.8, -3.519943181, 0.1), (1, 0, 0)), revolution_arc=204.907085957, mode=Mode.PRIVATE)
    fillet4_piece_2 = split(fillet4_piece_2, bisect_by=Plane(origin=(-2.894247633, -1.96496167, 0), z_dir=(0, 0, -1)), keep=Keep.TOP, mode=Mode.PRIVATE)
    add(fillet4_piece_2)

    # Sketch18 → Cut-Extrude5 (cut)
    with BuildSketch(Plane(origin=(-74.2, 0, 0), x_dir=(0, 0, -1), z_dir=(1, 0, 0))):
        with Locations((21, -6)):
            Rectangle(SKETCH18_W, SKETCH18_H)
    extrude(amount=-CUT_EXTRUDE5_DEPTH, mode=Mode.SUBTRACT)


solid = part.part
